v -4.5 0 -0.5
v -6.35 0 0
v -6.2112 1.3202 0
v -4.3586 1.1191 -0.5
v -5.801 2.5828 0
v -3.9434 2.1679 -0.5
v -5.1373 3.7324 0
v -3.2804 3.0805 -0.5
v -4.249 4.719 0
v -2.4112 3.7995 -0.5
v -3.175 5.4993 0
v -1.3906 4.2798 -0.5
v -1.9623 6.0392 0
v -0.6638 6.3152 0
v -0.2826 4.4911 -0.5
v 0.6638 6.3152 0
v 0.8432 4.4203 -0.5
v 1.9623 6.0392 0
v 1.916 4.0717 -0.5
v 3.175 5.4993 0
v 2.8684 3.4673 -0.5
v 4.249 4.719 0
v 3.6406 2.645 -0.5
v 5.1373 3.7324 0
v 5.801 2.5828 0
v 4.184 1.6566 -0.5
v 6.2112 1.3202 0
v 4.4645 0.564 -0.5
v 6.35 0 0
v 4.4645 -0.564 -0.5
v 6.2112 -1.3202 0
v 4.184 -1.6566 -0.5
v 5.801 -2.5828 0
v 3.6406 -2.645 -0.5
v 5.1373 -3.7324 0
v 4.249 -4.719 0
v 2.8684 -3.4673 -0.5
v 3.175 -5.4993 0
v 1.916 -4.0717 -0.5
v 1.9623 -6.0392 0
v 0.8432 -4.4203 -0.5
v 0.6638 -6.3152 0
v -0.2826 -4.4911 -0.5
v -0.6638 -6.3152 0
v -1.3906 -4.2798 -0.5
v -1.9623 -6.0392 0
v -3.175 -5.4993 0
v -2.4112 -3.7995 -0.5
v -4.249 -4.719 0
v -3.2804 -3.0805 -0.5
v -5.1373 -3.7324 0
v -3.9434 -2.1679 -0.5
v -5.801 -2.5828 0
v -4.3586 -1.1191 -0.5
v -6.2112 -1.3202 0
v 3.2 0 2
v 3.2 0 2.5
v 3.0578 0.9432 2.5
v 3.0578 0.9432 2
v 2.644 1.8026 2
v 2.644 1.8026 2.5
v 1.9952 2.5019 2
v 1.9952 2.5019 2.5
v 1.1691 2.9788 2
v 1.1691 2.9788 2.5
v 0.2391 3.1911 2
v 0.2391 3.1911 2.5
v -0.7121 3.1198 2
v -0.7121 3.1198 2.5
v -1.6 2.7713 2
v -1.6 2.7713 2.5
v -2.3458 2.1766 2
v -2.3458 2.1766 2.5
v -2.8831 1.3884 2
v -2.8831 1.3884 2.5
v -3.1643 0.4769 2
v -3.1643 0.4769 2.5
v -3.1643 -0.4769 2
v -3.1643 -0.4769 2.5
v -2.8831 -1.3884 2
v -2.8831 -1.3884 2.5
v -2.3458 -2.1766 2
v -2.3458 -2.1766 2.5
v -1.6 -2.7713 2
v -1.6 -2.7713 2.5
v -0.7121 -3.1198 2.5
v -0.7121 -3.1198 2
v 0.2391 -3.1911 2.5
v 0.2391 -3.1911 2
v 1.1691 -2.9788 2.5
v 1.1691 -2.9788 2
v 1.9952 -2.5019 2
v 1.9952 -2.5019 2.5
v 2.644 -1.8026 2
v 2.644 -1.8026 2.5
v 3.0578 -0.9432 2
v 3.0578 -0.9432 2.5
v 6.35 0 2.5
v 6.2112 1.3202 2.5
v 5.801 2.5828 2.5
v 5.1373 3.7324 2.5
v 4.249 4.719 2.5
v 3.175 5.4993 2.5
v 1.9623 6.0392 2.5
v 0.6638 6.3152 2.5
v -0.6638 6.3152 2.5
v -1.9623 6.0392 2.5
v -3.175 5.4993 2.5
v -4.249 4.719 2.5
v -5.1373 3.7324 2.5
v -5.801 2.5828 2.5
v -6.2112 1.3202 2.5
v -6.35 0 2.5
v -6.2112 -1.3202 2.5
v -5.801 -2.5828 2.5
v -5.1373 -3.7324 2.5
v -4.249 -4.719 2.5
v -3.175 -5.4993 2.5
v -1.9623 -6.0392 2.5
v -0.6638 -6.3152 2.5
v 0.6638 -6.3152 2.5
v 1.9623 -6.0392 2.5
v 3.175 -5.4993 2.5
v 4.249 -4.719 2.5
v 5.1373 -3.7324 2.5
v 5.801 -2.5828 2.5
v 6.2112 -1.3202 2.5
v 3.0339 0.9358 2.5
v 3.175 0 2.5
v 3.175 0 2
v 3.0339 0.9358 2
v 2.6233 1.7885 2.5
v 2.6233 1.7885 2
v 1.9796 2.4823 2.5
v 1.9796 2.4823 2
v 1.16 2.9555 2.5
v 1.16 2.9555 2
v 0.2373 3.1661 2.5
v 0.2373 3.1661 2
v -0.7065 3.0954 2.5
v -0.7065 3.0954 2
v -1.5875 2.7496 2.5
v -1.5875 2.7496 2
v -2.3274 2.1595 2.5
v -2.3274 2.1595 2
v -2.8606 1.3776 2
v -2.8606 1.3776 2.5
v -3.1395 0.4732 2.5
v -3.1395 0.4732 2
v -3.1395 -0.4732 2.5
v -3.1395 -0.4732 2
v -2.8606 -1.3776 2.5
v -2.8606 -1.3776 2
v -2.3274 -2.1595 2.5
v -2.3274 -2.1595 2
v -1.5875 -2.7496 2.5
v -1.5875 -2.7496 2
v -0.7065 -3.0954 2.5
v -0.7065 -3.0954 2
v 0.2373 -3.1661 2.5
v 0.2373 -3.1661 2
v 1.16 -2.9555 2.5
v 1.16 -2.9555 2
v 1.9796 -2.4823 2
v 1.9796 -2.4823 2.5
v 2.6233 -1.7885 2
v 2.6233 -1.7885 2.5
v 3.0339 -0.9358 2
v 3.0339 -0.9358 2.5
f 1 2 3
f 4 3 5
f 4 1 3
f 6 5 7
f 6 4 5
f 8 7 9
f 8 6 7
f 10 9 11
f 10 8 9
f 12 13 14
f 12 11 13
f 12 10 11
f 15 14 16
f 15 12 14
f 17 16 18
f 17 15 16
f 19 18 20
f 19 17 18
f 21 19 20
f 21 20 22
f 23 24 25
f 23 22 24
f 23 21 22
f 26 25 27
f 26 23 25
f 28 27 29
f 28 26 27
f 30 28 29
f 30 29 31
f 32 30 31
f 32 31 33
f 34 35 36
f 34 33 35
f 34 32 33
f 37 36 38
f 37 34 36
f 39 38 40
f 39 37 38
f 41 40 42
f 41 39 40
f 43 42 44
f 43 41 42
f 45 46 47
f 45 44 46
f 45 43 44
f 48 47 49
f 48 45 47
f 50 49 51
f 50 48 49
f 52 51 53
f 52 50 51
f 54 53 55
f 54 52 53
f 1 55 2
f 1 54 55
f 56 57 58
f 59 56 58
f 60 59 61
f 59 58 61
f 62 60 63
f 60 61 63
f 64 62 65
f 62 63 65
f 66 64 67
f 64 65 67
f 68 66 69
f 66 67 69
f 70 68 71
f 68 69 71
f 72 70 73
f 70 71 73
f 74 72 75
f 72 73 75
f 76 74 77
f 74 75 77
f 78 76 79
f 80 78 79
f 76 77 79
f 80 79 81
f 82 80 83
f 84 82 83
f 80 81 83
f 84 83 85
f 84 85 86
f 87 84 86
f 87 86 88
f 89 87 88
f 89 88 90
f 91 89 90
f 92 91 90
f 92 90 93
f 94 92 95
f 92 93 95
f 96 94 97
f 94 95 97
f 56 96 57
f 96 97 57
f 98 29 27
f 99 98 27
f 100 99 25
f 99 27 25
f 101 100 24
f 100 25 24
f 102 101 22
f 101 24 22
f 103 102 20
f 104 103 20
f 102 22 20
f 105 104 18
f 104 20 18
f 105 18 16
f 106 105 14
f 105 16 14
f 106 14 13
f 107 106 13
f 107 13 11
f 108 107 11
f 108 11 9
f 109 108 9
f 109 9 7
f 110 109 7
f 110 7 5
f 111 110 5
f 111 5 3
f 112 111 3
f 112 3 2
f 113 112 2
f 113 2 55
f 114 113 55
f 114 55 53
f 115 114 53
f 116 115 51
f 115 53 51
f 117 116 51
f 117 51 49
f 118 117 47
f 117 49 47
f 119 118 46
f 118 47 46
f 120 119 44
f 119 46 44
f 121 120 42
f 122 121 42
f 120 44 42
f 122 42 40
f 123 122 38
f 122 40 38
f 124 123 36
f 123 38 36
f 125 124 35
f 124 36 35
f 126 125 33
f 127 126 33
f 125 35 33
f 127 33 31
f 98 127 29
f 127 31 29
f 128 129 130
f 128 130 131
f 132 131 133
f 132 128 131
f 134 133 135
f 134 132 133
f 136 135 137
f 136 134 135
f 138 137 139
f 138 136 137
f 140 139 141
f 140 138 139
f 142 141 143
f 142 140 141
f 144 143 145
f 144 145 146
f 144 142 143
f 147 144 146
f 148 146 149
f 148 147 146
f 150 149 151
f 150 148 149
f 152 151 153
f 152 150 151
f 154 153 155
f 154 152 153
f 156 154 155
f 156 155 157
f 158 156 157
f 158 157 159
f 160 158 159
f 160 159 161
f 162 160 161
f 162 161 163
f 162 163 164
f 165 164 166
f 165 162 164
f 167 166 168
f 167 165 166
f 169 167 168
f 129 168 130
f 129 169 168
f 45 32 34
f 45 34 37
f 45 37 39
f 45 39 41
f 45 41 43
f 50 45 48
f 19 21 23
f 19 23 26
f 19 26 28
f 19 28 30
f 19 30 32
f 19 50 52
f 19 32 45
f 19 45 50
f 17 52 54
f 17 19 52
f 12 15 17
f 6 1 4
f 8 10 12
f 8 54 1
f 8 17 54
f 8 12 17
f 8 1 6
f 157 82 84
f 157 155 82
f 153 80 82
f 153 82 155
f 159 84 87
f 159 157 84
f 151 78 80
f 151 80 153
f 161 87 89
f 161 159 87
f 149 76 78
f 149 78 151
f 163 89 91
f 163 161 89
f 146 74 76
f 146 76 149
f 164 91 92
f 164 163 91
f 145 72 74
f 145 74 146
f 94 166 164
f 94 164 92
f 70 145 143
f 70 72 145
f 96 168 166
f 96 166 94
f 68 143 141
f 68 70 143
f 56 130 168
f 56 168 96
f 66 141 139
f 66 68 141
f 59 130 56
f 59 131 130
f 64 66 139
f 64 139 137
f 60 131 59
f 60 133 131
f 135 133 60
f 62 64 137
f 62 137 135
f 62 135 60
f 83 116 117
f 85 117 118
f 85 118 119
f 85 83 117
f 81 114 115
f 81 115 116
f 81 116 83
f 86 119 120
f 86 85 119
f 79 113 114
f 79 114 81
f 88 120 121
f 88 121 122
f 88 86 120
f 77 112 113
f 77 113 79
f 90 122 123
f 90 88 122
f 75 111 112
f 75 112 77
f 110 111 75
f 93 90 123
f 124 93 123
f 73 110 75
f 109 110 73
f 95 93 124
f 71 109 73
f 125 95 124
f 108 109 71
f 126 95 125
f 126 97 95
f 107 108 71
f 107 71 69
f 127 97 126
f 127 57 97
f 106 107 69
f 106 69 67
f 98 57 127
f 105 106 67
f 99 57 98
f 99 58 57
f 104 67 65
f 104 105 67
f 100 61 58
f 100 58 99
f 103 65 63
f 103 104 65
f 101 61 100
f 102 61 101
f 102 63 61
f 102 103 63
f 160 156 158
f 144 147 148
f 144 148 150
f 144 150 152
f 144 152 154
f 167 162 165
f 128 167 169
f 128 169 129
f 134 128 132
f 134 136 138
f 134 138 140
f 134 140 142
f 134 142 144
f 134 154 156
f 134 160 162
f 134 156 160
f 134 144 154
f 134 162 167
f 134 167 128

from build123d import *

# Parameters (mm, degrees)
F0_R     = 6.35
F1_DEPTH = 2.5
F2_R     = 3.2
F2_R_2   = 3.175
F3_DEPTH = 0.5


with BuildPart() as f1:
    # F0 (on Top) → F1 (new body)
    with BuildSketch(Plane.XY):
        Circle(F0_R)
    extrude(amount=F1_DEPTH)

    # F2 (on face) → F3 (cut)
    with BuildSketch(Plane.XY.offset(2.5)):
        Circle(F2_R)
        Circle(F2_R_2, mode=Mode.SUBTRACT)
    extrude(amount=-F3_DEPTH, mode=Mode.SUBTRACT)

    # F4 (on Front) → F5 (revolve)
    with BuildSketch(Plane.XZ):
        Polygon((0, 0), (-6.35, 0), (-4.5, -0.5), (0, -0.5), align=None)
    revolve(axis=Axis((0, 0, -0.25), (0, 0, -1)))


solid = f1.part
